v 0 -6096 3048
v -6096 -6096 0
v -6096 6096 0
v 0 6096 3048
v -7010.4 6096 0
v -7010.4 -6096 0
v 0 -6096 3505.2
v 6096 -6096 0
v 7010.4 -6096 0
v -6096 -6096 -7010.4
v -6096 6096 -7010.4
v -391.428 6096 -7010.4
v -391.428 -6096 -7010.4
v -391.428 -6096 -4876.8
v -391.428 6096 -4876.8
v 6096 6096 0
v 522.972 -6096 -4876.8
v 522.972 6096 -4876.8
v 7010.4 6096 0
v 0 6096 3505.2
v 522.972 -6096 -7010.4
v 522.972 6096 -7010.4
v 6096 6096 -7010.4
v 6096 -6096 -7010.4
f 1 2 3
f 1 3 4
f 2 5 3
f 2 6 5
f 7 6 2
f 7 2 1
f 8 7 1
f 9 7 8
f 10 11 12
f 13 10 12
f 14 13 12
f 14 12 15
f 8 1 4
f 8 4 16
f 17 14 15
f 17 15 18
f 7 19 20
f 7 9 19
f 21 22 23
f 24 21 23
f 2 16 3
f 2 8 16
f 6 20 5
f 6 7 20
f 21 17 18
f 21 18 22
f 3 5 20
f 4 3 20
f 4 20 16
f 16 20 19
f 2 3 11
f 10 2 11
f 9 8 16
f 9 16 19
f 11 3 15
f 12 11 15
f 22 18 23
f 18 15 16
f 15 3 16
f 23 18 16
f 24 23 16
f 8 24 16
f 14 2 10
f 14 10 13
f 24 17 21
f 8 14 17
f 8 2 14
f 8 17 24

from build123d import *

# Parameters (mm, degrees)
F1_DEPTH = 6096


# Not quite as in the source:
# - the program builds the solid bodies; features that only make, move or delete a surface that nothing else refers to are left out


with BuildPart() as f1:
    # F0 (on Front) → F1 (new body, symmetric)
    with BuildSketch(Plane.XZ):
        Polygon((-7010.4, 0), (-6096, 0), (0, 3048), (0, 3505.2), align=None)
        Polygon((0, 3048), (6096, 0), (7010.4, 0), (0, 3505.2), align=None)
    extrude(amount=F1_DEPTH, both=True)


with BuildPart() as f1b:
    # F0 (on Front) → F1, piece 2 (new body, symmetric)
    with BuildSketch(Plane.XZ):
        Polygon((0, -4876.8), (0, 0), (-6096, 0), (-6096, -7010.4), (-391.4279341698, -7010.4), (-391.4279341698, -4876.8), align=None)
        Polygon((6096, 0), (0, 0), (0, -4876.8), (522.9720658302, -4876.8), (522.9720658302, -7010.4), (6096, -7010.4), align=None)
    extrude(amount=F1_DEPTH, both=True)


solid = Compound([f1.part, f1b.part])
